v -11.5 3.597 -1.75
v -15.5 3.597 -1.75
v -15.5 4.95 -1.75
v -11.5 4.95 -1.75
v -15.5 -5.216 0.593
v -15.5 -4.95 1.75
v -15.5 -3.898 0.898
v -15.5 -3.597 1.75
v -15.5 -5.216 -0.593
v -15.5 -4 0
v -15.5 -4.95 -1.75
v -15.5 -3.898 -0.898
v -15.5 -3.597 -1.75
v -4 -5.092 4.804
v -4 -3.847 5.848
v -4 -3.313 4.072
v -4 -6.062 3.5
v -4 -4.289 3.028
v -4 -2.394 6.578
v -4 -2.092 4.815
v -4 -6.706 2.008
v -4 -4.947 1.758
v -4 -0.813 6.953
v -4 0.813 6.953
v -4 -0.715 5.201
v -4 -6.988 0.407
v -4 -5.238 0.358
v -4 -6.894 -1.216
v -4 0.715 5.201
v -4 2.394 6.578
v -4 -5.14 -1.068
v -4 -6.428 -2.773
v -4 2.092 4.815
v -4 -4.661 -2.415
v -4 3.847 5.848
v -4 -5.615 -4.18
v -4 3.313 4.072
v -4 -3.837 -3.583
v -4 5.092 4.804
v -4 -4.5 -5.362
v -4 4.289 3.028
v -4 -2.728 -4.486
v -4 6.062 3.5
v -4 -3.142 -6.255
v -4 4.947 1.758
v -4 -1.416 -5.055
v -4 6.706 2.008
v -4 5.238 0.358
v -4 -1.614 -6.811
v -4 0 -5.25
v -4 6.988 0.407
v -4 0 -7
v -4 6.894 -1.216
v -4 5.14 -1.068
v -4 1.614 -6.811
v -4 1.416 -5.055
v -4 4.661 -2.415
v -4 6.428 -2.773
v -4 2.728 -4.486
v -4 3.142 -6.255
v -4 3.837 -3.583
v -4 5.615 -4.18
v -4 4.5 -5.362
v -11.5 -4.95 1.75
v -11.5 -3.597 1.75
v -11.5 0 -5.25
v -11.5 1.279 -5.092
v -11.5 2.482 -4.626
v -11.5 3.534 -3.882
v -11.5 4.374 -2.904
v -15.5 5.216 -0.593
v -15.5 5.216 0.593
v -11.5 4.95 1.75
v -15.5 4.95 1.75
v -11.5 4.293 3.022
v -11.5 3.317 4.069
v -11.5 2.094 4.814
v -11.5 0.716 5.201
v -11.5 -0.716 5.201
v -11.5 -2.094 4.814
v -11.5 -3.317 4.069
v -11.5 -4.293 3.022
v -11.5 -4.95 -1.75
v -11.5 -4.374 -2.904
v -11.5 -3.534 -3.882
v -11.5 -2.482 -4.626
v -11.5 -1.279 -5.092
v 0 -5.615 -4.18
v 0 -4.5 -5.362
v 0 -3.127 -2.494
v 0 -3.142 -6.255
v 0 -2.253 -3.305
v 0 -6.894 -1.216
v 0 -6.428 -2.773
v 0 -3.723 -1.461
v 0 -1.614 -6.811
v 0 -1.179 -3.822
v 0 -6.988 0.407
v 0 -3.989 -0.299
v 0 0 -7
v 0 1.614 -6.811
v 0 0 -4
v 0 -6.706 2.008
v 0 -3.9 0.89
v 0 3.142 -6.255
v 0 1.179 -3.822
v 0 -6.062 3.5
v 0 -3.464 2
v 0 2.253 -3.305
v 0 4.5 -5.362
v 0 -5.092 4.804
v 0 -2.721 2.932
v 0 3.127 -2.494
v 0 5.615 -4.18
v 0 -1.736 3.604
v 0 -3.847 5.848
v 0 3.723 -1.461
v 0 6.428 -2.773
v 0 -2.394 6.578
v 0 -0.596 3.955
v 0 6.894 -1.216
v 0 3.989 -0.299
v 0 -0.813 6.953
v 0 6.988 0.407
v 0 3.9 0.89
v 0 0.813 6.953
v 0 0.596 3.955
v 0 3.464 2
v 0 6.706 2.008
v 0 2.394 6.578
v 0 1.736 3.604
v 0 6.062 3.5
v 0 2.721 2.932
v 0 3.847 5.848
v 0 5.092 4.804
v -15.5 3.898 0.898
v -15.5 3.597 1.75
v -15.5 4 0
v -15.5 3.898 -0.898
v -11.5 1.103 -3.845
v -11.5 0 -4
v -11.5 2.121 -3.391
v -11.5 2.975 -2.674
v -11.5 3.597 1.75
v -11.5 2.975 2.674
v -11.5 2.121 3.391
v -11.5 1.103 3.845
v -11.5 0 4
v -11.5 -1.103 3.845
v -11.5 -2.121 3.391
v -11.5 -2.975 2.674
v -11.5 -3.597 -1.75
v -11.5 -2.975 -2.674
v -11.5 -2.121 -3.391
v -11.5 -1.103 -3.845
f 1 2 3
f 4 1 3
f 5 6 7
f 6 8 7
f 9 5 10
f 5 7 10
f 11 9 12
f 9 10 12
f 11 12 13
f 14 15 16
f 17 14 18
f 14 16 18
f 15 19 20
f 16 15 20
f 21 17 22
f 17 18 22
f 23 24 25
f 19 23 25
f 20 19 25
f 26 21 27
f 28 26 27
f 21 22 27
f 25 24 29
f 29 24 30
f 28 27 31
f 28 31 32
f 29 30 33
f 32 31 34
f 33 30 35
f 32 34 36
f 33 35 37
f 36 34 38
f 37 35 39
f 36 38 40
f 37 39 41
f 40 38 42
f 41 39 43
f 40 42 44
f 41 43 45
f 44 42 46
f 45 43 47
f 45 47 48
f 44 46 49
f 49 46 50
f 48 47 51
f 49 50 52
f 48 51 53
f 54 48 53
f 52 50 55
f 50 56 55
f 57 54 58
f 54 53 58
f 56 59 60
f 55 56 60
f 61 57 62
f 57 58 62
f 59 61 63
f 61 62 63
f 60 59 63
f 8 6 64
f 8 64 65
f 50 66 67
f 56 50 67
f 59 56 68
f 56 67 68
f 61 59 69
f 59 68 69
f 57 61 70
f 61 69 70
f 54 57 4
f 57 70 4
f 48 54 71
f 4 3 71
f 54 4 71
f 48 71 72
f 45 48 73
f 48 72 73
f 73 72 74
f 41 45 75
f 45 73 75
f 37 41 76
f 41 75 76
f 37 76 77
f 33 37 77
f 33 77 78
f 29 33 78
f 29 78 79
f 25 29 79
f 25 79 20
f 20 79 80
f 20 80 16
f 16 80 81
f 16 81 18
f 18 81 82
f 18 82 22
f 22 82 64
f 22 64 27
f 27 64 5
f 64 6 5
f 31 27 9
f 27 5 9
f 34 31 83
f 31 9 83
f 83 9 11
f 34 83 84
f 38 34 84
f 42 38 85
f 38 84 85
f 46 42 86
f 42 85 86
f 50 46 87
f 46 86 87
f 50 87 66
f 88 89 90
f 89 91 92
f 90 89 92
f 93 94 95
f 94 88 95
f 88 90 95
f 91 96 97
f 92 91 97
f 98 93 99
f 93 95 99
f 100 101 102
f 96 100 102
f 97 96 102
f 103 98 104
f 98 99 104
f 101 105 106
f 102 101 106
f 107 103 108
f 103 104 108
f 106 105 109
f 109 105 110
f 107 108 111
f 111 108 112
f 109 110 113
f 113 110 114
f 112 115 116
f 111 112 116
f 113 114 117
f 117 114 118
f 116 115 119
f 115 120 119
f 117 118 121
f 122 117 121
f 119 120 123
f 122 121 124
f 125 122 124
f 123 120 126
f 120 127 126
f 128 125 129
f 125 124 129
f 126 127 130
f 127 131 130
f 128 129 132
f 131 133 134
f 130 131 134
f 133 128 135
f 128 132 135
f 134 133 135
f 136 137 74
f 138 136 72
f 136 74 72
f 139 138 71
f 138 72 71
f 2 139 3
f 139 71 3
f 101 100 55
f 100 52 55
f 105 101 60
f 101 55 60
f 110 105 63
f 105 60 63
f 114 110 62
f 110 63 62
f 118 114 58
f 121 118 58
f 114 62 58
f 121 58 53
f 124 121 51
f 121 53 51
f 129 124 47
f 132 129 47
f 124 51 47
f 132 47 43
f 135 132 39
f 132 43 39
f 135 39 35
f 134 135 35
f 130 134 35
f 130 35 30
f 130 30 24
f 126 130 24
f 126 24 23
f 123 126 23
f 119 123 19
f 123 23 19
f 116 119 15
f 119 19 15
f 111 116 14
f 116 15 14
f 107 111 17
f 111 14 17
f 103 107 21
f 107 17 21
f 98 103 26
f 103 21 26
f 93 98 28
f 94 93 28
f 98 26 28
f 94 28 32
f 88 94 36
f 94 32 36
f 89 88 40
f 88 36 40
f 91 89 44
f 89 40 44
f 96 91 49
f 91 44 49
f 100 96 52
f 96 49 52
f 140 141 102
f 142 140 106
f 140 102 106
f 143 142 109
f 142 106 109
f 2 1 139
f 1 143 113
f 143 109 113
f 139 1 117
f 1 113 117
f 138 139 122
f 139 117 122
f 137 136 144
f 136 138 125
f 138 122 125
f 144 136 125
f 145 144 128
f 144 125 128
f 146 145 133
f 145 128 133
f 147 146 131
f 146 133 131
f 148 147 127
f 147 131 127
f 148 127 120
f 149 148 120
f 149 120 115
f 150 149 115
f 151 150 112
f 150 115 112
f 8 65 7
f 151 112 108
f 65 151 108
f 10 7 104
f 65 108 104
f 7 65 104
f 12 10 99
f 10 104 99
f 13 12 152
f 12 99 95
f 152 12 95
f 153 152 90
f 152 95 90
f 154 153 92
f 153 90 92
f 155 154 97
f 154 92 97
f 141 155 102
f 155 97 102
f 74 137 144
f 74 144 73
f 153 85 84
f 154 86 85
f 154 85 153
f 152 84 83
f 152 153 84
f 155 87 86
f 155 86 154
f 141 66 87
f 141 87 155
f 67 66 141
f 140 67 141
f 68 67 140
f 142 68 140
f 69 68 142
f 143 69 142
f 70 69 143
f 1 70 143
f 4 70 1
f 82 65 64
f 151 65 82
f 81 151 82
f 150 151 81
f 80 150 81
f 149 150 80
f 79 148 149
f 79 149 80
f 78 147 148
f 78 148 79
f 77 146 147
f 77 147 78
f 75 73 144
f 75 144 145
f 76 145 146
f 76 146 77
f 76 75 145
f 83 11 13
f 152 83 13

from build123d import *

# Parameters (mm, degrees)
SKETCH2_W          = 3.5
SKETCH2_H          = 9.899494936
CUT_EXTRUDE1_DEPTH = 4


with BuildPart() as part:
    # Sketch1 → Revolve1 (revolve)
    with BuildSketch(Plane(origin=(0, 0, 0), x_dir=(1, 0, 0), z_dir=(0, 1, 0))):
        Polygon((0, 4), (0, 7), (-4, 7), (-4, 5.25), (-15.5, 5.25), (-15.5, 4), align=None)
    revolve(axis=Axis((-5.134665776, 0, 0), (1, 0, 0)))

    # Sketch2 → Cut-Extrude1 (cut)
    with BuildSketch(Plane.ZY.offset(15.5)):
        with Locations((-3.5, 0)):
            Rectangle(SKETCH2_W, SKETCH2_H)
        with Locations((3.5, 0)):
            Rectangle(SKETCH2_W, SKETCH2_H)
    extrude(amount=-CUT_EXTRUDE1_DEPTH, mode=Mode.SUBTRACT)


solid = part.part
